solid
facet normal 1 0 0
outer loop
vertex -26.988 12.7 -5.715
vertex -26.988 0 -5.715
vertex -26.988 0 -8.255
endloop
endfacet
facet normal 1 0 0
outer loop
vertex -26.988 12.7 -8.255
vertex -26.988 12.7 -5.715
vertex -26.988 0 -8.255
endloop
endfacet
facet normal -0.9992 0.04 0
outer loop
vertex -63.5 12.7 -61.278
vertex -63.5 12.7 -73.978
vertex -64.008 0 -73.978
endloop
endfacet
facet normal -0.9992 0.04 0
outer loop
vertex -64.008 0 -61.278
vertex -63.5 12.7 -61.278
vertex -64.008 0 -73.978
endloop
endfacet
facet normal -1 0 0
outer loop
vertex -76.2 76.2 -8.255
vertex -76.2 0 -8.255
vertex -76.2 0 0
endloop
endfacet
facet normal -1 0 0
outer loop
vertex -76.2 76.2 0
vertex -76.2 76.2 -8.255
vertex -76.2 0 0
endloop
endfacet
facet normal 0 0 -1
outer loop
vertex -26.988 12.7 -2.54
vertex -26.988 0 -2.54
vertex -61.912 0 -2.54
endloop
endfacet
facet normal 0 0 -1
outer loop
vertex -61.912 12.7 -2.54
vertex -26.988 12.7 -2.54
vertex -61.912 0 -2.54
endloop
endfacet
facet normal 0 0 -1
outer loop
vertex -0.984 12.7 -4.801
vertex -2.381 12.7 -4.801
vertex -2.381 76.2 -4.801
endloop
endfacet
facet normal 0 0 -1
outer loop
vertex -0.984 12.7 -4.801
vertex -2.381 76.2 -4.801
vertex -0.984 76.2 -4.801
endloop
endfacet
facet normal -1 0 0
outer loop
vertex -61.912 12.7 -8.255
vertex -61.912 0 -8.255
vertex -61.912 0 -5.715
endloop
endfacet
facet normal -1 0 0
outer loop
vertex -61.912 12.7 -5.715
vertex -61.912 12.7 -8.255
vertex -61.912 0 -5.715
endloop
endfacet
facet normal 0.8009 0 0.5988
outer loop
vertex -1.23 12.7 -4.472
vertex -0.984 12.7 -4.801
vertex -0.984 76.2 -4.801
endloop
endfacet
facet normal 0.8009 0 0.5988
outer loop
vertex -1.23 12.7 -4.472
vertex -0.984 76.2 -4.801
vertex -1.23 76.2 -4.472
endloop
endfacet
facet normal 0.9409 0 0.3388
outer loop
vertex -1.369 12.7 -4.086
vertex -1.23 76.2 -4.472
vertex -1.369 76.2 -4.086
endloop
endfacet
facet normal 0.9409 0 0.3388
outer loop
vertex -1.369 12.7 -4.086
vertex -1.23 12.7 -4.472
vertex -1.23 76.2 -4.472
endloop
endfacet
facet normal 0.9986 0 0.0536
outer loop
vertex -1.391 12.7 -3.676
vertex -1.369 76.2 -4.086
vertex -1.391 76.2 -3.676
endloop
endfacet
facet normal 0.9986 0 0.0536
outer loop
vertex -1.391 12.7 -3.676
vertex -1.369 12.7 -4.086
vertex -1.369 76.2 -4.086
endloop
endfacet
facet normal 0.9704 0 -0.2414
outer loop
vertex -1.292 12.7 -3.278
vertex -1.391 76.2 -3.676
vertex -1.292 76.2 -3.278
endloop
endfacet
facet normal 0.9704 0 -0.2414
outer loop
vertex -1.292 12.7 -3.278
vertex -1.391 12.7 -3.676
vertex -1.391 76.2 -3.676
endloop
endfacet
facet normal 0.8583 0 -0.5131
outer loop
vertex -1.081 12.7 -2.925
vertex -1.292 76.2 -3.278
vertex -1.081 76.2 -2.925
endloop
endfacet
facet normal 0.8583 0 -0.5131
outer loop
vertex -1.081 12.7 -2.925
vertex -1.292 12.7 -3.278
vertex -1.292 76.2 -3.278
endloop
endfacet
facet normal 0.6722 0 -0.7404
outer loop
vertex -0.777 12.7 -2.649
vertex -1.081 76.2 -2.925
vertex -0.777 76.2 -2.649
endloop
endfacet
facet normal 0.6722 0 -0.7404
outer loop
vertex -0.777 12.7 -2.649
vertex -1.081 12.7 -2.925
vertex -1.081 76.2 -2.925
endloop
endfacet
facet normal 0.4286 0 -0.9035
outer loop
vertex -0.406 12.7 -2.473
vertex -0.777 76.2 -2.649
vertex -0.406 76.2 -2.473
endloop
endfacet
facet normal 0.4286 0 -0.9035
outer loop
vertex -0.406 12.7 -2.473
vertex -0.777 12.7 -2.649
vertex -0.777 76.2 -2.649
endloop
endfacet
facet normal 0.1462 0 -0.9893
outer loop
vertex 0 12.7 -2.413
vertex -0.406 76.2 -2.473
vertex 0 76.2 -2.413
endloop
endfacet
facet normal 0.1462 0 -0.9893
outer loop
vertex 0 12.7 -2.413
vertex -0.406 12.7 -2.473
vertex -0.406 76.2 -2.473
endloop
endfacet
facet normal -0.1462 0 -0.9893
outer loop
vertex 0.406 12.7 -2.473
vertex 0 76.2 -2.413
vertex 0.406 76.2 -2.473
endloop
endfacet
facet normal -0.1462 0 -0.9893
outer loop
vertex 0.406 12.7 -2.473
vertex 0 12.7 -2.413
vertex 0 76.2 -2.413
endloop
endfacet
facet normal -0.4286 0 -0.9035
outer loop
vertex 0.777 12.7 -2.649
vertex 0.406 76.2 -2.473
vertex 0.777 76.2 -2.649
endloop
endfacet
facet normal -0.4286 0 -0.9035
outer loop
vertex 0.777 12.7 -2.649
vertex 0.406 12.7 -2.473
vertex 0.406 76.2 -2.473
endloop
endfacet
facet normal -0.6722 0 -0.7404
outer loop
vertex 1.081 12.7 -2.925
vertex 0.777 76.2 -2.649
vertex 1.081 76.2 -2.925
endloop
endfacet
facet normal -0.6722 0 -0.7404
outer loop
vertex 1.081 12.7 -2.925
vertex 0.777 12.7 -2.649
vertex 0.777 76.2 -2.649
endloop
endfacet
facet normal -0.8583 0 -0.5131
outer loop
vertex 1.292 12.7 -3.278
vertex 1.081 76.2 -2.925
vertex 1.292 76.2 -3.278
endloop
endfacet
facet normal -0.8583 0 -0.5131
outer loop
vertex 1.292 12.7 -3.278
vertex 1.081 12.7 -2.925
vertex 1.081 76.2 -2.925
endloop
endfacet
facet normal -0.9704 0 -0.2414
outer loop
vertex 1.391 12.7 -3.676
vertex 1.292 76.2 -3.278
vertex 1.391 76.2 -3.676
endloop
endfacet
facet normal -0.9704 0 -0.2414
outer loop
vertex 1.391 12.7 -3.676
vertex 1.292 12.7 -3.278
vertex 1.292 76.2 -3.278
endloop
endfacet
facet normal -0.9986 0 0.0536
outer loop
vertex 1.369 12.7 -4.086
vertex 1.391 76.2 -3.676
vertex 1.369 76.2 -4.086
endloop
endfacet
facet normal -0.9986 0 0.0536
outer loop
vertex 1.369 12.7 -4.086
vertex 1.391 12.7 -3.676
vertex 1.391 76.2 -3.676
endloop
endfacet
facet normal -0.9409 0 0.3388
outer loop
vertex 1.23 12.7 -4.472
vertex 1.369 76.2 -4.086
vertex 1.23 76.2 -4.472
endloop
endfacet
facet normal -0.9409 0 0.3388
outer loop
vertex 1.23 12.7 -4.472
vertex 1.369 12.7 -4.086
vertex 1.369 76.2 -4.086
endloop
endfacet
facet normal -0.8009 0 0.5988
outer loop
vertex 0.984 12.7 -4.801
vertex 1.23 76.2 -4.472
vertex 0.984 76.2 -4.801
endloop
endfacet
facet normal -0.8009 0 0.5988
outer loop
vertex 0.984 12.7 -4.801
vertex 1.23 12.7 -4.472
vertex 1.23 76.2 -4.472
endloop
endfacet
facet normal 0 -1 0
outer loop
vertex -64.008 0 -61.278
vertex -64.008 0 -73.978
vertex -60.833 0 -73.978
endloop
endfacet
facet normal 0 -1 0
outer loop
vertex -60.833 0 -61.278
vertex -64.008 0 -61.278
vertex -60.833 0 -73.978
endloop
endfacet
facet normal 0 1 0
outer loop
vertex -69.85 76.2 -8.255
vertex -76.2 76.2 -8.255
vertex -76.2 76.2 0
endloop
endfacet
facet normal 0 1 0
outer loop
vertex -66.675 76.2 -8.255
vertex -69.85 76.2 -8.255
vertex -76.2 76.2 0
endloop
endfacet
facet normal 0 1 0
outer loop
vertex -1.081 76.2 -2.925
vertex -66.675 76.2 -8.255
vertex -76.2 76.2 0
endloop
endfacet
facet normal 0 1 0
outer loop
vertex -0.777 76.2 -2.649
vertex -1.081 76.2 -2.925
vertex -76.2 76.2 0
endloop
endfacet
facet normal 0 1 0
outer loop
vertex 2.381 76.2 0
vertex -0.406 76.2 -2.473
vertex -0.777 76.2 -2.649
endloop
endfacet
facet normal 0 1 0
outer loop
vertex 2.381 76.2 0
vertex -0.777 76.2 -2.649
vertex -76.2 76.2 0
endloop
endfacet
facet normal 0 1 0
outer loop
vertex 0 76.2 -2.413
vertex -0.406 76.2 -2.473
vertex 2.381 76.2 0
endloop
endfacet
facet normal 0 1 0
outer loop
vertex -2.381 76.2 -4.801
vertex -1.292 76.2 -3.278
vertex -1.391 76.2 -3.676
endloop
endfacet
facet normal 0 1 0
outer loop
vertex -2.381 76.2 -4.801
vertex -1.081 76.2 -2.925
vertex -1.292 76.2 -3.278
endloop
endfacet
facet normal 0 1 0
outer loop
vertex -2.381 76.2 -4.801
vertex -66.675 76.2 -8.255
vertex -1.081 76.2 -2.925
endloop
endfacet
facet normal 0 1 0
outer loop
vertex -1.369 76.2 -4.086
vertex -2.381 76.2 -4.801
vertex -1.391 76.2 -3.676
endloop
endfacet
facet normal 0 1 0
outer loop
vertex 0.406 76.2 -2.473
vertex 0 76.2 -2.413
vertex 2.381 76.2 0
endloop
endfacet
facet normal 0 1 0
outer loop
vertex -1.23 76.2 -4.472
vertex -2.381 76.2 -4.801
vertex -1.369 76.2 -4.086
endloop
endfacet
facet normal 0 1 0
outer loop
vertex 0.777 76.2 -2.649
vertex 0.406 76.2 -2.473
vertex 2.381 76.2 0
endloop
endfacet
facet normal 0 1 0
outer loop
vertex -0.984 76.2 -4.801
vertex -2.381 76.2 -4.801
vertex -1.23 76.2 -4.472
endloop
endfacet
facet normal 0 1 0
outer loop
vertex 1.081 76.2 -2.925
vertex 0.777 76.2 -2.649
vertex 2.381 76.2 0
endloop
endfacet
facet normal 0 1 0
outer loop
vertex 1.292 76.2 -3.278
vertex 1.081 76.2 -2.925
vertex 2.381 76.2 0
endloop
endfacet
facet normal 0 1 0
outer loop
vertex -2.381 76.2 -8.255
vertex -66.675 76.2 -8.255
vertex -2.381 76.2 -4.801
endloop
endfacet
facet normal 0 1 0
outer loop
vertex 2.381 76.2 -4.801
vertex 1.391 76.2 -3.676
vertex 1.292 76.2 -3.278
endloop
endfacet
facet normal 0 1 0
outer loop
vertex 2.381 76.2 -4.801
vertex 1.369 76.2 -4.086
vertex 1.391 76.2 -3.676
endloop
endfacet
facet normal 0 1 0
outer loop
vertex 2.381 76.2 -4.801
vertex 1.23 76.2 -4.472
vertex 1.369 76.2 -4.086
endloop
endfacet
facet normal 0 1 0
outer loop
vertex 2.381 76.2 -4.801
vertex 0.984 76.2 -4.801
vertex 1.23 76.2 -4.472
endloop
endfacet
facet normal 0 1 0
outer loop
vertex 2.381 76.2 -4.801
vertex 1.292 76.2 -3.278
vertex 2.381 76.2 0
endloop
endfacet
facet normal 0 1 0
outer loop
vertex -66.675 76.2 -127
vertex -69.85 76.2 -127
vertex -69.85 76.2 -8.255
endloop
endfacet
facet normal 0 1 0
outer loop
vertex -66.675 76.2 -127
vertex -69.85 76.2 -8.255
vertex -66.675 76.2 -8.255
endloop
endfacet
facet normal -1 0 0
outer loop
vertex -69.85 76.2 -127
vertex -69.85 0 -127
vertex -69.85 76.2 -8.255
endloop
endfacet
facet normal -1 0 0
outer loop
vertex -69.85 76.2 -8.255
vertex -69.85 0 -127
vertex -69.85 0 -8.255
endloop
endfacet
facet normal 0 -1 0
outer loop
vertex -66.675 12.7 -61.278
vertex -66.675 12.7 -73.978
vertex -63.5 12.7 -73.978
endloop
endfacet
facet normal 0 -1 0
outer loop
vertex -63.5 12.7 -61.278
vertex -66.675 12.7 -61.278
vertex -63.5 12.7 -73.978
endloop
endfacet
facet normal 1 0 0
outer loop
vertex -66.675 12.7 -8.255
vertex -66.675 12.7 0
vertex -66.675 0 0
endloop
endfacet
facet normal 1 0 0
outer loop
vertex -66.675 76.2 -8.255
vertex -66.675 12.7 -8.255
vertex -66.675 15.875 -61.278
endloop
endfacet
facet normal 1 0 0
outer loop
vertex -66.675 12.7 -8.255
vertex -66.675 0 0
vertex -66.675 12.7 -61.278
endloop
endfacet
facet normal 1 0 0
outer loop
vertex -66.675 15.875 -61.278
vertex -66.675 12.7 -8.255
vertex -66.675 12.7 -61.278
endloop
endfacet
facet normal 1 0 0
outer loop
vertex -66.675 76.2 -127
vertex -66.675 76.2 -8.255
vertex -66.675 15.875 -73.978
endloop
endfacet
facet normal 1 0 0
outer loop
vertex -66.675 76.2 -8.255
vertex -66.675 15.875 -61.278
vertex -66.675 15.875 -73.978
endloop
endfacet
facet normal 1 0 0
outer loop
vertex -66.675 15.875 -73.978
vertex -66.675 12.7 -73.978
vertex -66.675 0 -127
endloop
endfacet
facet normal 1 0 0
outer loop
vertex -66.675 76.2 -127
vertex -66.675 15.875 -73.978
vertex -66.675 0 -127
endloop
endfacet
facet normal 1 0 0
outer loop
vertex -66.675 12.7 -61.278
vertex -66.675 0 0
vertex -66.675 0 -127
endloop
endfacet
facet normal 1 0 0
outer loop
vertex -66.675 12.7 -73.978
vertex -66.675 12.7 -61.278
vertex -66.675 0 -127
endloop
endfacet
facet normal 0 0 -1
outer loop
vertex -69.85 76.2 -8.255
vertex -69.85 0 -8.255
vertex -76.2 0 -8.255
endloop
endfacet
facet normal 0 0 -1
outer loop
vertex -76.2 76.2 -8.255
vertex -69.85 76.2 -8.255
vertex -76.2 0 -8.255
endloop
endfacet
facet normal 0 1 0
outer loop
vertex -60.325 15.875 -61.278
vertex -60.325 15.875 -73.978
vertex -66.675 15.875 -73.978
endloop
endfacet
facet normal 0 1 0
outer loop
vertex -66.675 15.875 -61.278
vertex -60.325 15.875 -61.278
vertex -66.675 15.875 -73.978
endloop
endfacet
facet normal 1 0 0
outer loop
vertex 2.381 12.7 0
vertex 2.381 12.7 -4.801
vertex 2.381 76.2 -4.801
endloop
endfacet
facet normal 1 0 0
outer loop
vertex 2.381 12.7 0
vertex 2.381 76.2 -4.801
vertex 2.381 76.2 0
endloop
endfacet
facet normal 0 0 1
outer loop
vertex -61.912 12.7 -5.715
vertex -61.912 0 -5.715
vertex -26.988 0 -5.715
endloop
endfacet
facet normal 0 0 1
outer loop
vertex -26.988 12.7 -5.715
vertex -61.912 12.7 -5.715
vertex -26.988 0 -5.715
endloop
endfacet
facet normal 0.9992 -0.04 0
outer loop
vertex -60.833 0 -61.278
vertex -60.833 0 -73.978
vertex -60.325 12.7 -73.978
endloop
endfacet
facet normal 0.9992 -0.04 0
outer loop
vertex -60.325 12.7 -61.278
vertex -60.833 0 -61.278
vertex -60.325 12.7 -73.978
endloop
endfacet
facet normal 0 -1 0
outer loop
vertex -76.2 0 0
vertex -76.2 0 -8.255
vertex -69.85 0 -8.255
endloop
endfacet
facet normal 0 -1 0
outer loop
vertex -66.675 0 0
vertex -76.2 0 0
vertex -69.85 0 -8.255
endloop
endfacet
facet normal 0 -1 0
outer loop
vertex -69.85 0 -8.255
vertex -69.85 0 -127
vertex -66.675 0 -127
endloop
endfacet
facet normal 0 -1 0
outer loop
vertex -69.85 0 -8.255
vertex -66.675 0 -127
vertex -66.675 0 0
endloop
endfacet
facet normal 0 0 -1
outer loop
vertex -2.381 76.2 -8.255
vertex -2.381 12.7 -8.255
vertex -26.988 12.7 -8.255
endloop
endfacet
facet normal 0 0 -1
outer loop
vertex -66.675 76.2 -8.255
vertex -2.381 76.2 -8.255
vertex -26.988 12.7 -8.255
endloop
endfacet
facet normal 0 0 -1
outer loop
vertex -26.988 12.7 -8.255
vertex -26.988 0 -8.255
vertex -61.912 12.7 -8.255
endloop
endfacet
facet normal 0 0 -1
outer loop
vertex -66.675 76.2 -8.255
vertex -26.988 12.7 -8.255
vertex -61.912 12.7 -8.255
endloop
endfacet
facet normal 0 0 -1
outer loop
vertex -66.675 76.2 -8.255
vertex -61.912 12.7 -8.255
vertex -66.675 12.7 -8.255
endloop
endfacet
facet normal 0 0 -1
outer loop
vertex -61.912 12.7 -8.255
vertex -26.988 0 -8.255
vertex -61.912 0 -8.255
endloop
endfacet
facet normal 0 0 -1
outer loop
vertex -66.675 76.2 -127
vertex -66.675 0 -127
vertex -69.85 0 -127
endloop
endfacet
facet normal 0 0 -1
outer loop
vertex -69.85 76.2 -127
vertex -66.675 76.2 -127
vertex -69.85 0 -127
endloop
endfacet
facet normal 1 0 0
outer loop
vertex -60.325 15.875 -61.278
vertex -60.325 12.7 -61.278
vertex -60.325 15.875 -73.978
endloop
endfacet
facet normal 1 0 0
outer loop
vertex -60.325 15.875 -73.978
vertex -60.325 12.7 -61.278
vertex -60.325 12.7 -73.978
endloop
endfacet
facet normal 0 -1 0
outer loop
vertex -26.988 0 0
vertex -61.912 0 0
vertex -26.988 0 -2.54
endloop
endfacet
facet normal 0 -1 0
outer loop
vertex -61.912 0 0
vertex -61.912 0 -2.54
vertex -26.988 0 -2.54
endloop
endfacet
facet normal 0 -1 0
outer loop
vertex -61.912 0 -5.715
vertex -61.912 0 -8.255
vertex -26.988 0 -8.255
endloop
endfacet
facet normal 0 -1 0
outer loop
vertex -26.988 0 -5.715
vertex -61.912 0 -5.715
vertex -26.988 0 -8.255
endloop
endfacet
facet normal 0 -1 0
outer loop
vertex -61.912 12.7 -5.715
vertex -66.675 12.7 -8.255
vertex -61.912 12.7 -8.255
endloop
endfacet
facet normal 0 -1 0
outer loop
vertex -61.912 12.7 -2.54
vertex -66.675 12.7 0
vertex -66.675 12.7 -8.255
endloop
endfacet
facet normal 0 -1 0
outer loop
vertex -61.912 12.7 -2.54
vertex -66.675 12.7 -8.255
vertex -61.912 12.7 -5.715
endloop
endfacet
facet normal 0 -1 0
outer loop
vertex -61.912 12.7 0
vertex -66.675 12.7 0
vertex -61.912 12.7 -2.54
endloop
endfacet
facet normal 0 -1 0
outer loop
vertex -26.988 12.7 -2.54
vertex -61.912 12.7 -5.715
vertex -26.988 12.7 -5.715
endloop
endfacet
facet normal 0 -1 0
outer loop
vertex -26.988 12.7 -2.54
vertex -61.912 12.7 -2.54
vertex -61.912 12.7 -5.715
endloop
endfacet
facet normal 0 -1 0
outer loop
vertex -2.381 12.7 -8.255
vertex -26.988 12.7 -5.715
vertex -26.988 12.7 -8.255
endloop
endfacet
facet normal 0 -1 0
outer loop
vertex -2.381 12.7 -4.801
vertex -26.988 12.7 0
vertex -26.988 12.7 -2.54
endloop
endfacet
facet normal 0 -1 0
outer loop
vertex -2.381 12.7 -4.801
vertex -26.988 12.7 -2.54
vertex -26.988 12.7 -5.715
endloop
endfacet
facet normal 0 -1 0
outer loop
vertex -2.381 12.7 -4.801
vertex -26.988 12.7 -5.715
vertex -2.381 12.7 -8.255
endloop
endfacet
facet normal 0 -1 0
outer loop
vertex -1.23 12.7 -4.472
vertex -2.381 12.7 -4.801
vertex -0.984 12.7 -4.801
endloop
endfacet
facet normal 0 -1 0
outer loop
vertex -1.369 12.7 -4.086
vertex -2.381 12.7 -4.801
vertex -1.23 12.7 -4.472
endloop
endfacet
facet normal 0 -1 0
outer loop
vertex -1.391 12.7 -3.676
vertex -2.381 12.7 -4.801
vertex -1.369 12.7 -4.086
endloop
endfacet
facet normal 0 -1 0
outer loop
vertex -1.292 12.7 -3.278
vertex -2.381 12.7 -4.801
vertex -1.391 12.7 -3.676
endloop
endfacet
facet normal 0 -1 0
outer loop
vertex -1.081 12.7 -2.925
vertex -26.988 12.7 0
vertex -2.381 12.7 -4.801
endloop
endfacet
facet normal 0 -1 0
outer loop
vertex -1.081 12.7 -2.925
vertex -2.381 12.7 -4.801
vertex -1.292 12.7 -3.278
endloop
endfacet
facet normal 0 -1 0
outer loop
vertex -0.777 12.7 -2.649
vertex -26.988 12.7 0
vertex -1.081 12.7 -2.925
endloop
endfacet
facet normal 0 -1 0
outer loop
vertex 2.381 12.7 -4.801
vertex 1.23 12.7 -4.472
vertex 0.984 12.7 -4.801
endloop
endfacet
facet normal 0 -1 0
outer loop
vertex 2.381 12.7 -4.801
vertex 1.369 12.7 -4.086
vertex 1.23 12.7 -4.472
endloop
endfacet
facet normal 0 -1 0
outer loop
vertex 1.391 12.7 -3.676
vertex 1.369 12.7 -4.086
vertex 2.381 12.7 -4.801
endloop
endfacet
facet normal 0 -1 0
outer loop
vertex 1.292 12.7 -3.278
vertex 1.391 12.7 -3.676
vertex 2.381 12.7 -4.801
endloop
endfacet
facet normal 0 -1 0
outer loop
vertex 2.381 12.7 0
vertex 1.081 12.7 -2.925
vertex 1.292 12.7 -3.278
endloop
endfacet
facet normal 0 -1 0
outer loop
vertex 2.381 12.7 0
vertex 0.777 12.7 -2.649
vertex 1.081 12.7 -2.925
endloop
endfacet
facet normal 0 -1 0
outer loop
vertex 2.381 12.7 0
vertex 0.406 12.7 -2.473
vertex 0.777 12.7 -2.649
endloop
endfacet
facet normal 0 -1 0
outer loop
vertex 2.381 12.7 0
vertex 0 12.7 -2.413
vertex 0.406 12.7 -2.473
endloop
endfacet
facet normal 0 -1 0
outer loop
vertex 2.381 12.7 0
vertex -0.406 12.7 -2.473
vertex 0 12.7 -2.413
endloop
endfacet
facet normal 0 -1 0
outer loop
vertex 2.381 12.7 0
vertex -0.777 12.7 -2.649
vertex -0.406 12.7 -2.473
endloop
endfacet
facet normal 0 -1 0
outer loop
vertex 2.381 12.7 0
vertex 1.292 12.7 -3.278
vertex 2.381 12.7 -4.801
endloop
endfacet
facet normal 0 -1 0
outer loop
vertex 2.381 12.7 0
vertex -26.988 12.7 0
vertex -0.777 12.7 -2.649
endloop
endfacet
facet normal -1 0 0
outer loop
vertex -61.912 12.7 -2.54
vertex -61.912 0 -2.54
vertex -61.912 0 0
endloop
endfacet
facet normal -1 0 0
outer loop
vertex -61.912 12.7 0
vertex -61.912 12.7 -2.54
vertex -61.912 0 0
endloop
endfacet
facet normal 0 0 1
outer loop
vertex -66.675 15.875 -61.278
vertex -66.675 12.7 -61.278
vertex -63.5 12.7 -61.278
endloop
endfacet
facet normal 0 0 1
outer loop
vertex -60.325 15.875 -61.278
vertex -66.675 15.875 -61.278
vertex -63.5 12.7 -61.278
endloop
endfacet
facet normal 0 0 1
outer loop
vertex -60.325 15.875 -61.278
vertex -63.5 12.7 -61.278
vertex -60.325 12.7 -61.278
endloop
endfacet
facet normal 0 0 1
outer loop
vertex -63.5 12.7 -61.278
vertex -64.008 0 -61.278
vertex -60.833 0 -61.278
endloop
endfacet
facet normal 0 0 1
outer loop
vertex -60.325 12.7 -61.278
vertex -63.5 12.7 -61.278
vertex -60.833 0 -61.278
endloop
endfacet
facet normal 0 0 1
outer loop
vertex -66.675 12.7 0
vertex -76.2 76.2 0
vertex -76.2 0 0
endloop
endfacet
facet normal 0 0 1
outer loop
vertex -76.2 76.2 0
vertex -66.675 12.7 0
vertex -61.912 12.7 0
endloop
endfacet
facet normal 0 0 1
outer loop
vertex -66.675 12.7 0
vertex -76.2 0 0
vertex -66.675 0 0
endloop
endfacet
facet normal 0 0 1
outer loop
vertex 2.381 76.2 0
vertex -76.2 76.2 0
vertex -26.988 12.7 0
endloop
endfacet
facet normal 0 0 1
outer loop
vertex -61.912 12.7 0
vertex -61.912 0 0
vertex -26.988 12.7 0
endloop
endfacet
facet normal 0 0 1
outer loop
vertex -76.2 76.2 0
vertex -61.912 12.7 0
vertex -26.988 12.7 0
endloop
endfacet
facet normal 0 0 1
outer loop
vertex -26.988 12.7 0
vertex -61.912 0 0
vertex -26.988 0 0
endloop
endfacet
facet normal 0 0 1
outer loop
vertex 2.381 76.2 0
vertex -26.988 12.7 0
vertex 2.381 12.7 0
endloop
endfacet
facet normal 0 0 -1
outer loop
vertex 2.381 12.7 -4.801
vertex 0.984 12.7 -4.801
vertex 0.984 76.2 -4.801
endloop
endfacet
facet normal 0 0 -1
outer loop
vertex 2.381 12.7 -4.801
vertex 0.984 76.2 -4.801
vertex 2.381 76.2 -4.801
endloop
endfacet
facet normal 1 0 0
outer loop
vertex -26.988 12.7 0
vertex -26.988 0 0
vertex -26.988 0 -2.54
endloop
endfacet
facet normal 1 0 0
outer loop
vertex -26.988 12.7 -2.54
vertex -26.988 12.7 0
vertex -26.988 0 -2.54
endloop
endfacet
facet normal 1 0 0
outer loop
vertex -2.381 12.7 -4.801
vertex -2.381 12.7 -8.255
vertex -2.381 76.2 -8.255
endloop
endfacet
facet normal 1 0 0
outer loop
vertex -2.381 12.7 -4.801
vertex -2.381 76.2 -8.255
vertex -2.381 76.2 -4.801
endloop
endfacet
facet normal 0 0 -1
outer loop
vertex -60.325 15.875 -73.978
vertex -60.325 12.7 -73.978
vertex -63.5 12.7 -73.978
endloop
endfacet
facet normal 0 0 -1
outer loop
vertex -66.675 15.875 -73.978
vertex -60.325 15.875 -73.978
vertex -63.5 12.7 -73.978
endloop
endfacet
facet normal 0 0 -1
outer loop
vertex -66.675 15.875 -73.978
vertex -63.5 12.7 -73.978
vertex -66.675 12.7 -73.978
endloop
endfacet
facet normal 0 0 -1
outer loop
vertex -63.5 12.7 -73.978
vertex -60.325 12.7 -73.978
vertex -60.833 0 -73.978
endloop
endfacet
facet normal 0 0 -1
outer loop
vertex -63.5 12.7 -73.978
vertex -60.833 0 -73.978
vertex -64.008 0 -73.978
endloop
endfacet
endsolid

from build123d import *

# Parameters (mm, degrees)
BOSS_EXTRUDE1_DEPTH = 76.2
SKETCH9_W           = 6.35
SKETCH9_H           = 60.325
CUT_EXTRUDE1_DEPTH  = 65.7225
CUT_EXTRUDE2_DEPTH  = 12.7
LEFTCUT_DEPTH       = 76.2


# Read off the part's stored shape, not the designer's step: LeftCut
with BuildPart() as part:
    # Sketch8 → Boss-Extrude1 (new body)
    with BuildSketch(Plane(origin=(0, 0, 0), x_dir=(1, 0, 0), z_dir=(0, 1, 0))):
        Polygon((66.675, 8.255), (-66.675, 8.255), (-66.675, 61.2775), (-60.325, 61.2775), (-60.325, 73.9775), (-66.675, 73.9775), (-66.675, 127), (-69.85, 127), (-69.85, 8.255), (-76.2, 8.255), (-76.2, 0), (76.2, 0), (76.2, 8.255), (69.85, 8.255), (69.85, 127), (66.675, 127), (66.675, 73.9775), (60.325, 73.9775), (60.325, 61.2775), (66.675, 61.2775), align=None)
    extrude(amount=BOSS_EXTRUDE1_DEPTH)

    # Sketch9 → Cut-Extrude1 (cut)
    with BuildSketch(Plane(origin=(0, 0, -73.9775), x_dir=(-1, 0, 0), z_dir=(0, 0, -1))):
        Polygon((-66.675, 12.7), (-66.675, 0), (-64.008, 0), (-63.5, 12.7), align=None)
        Polygon((66.675, 12.7), (63.5, 12.7), (64.008, 0), (66.675, 0), align=None)
        with Locations((-63.5, 46.0375)):
            Rectangle(SKETCH9_W, SKETCH9_H)
        Polygon((-60.325, 0), (-60.325, 12.7), (-60.833, 0), align=None)
        Polygon((-60.198, 15.875), (-60.325, 15.875), (-60.325, 12.7), align=None)
        Polygon((60.833, 0), (60.325, 12.7), (60.325, 0), align=None)
        Polygon((60.325, 12.7), (60.325, 15.875), (60.198, 15.875), align=None)
        with Locations((63.5, 46.0375)):
            Rectangle(SKETCH9_W, SKETCH9_H)
    extrude(amount=-CUT_EXTRUDE1_DEPTH, mode=Mode.SUBTRACT)

    # Sketch10 → Cut-Extrude2 (cut)
    with BuildSketch(Plane.XZ):
        Polygon((26.9875, -5.715), (61.9125, -5.715), (61.9125, -8.255), (66.675, -8.255), (66.675, 0), (61.9125, 0), (61.9125, -2.54), (26.9875, -2.54), (26.9875, 0), (-26.9875, 0), (-26.9875, -2.54), (-61.9125, -2.54), (-61.9125, 0), (-66.675, 0), (-66.675, -8.255), (-61.9125, -8.255), (-61.9125, -5.715), (-26.9875, -5.715), (-26.9875, -8.255), (26.9875, -8.255), align=None)
    extrude(amount=-CUT_EXTRUDE2_DEPTH, mode=Mode.SUBTRACT)

    # LeftCut outline → LeftCut (cut)
    with BuildSketch(Plane(origin=(0, 0, 0), x_dir=(1, 0, 0), z_dir=(0, 1, 0))):
        with BuildLine():
            ThreePointArc((-0.98425, 4.801393432), (0, 2.413), (0.98425, 4.801393432))
            Line((0.98425, 4.801393432), (2.38125, 4.801393432))
            Line((2.38125, 4.801393432), (2.38125, 0))
            Line((2.38125, 0), (76.2, 0))
            Line((76.2, 0), (76.2, 8.255))
            Line((76.2, 8.255), (69.85, 8.255))
            Line((69.85, 8.255), (69.85, 127))
            Line((69.85, 127), (66.675, 127))
            Line((66.675, 127), (66.675, 73.9775))
            Line((66.675, 73.9775), (60.325, 73.9775))
            Line((60.325, 73.9775), (60.325, 61.2775))
            Line((60.325, 61.2775), (66.675, 61.2775))
            Line((66.675, 61.2775), (66.675, 8.255))
            Line((66.675, 8.255), (-2.38125, 8.255))
            Line((-2.38125, 8.255), (-2.38125, 4.801393432))
            Line((-2.38125, 4.801393432), (-0.98425, 4.801393432))
        make_face()
    extrude(amount=LEFTCUT_DEPTH, mode=Mode.SUBTRACT)


solid = part.part
